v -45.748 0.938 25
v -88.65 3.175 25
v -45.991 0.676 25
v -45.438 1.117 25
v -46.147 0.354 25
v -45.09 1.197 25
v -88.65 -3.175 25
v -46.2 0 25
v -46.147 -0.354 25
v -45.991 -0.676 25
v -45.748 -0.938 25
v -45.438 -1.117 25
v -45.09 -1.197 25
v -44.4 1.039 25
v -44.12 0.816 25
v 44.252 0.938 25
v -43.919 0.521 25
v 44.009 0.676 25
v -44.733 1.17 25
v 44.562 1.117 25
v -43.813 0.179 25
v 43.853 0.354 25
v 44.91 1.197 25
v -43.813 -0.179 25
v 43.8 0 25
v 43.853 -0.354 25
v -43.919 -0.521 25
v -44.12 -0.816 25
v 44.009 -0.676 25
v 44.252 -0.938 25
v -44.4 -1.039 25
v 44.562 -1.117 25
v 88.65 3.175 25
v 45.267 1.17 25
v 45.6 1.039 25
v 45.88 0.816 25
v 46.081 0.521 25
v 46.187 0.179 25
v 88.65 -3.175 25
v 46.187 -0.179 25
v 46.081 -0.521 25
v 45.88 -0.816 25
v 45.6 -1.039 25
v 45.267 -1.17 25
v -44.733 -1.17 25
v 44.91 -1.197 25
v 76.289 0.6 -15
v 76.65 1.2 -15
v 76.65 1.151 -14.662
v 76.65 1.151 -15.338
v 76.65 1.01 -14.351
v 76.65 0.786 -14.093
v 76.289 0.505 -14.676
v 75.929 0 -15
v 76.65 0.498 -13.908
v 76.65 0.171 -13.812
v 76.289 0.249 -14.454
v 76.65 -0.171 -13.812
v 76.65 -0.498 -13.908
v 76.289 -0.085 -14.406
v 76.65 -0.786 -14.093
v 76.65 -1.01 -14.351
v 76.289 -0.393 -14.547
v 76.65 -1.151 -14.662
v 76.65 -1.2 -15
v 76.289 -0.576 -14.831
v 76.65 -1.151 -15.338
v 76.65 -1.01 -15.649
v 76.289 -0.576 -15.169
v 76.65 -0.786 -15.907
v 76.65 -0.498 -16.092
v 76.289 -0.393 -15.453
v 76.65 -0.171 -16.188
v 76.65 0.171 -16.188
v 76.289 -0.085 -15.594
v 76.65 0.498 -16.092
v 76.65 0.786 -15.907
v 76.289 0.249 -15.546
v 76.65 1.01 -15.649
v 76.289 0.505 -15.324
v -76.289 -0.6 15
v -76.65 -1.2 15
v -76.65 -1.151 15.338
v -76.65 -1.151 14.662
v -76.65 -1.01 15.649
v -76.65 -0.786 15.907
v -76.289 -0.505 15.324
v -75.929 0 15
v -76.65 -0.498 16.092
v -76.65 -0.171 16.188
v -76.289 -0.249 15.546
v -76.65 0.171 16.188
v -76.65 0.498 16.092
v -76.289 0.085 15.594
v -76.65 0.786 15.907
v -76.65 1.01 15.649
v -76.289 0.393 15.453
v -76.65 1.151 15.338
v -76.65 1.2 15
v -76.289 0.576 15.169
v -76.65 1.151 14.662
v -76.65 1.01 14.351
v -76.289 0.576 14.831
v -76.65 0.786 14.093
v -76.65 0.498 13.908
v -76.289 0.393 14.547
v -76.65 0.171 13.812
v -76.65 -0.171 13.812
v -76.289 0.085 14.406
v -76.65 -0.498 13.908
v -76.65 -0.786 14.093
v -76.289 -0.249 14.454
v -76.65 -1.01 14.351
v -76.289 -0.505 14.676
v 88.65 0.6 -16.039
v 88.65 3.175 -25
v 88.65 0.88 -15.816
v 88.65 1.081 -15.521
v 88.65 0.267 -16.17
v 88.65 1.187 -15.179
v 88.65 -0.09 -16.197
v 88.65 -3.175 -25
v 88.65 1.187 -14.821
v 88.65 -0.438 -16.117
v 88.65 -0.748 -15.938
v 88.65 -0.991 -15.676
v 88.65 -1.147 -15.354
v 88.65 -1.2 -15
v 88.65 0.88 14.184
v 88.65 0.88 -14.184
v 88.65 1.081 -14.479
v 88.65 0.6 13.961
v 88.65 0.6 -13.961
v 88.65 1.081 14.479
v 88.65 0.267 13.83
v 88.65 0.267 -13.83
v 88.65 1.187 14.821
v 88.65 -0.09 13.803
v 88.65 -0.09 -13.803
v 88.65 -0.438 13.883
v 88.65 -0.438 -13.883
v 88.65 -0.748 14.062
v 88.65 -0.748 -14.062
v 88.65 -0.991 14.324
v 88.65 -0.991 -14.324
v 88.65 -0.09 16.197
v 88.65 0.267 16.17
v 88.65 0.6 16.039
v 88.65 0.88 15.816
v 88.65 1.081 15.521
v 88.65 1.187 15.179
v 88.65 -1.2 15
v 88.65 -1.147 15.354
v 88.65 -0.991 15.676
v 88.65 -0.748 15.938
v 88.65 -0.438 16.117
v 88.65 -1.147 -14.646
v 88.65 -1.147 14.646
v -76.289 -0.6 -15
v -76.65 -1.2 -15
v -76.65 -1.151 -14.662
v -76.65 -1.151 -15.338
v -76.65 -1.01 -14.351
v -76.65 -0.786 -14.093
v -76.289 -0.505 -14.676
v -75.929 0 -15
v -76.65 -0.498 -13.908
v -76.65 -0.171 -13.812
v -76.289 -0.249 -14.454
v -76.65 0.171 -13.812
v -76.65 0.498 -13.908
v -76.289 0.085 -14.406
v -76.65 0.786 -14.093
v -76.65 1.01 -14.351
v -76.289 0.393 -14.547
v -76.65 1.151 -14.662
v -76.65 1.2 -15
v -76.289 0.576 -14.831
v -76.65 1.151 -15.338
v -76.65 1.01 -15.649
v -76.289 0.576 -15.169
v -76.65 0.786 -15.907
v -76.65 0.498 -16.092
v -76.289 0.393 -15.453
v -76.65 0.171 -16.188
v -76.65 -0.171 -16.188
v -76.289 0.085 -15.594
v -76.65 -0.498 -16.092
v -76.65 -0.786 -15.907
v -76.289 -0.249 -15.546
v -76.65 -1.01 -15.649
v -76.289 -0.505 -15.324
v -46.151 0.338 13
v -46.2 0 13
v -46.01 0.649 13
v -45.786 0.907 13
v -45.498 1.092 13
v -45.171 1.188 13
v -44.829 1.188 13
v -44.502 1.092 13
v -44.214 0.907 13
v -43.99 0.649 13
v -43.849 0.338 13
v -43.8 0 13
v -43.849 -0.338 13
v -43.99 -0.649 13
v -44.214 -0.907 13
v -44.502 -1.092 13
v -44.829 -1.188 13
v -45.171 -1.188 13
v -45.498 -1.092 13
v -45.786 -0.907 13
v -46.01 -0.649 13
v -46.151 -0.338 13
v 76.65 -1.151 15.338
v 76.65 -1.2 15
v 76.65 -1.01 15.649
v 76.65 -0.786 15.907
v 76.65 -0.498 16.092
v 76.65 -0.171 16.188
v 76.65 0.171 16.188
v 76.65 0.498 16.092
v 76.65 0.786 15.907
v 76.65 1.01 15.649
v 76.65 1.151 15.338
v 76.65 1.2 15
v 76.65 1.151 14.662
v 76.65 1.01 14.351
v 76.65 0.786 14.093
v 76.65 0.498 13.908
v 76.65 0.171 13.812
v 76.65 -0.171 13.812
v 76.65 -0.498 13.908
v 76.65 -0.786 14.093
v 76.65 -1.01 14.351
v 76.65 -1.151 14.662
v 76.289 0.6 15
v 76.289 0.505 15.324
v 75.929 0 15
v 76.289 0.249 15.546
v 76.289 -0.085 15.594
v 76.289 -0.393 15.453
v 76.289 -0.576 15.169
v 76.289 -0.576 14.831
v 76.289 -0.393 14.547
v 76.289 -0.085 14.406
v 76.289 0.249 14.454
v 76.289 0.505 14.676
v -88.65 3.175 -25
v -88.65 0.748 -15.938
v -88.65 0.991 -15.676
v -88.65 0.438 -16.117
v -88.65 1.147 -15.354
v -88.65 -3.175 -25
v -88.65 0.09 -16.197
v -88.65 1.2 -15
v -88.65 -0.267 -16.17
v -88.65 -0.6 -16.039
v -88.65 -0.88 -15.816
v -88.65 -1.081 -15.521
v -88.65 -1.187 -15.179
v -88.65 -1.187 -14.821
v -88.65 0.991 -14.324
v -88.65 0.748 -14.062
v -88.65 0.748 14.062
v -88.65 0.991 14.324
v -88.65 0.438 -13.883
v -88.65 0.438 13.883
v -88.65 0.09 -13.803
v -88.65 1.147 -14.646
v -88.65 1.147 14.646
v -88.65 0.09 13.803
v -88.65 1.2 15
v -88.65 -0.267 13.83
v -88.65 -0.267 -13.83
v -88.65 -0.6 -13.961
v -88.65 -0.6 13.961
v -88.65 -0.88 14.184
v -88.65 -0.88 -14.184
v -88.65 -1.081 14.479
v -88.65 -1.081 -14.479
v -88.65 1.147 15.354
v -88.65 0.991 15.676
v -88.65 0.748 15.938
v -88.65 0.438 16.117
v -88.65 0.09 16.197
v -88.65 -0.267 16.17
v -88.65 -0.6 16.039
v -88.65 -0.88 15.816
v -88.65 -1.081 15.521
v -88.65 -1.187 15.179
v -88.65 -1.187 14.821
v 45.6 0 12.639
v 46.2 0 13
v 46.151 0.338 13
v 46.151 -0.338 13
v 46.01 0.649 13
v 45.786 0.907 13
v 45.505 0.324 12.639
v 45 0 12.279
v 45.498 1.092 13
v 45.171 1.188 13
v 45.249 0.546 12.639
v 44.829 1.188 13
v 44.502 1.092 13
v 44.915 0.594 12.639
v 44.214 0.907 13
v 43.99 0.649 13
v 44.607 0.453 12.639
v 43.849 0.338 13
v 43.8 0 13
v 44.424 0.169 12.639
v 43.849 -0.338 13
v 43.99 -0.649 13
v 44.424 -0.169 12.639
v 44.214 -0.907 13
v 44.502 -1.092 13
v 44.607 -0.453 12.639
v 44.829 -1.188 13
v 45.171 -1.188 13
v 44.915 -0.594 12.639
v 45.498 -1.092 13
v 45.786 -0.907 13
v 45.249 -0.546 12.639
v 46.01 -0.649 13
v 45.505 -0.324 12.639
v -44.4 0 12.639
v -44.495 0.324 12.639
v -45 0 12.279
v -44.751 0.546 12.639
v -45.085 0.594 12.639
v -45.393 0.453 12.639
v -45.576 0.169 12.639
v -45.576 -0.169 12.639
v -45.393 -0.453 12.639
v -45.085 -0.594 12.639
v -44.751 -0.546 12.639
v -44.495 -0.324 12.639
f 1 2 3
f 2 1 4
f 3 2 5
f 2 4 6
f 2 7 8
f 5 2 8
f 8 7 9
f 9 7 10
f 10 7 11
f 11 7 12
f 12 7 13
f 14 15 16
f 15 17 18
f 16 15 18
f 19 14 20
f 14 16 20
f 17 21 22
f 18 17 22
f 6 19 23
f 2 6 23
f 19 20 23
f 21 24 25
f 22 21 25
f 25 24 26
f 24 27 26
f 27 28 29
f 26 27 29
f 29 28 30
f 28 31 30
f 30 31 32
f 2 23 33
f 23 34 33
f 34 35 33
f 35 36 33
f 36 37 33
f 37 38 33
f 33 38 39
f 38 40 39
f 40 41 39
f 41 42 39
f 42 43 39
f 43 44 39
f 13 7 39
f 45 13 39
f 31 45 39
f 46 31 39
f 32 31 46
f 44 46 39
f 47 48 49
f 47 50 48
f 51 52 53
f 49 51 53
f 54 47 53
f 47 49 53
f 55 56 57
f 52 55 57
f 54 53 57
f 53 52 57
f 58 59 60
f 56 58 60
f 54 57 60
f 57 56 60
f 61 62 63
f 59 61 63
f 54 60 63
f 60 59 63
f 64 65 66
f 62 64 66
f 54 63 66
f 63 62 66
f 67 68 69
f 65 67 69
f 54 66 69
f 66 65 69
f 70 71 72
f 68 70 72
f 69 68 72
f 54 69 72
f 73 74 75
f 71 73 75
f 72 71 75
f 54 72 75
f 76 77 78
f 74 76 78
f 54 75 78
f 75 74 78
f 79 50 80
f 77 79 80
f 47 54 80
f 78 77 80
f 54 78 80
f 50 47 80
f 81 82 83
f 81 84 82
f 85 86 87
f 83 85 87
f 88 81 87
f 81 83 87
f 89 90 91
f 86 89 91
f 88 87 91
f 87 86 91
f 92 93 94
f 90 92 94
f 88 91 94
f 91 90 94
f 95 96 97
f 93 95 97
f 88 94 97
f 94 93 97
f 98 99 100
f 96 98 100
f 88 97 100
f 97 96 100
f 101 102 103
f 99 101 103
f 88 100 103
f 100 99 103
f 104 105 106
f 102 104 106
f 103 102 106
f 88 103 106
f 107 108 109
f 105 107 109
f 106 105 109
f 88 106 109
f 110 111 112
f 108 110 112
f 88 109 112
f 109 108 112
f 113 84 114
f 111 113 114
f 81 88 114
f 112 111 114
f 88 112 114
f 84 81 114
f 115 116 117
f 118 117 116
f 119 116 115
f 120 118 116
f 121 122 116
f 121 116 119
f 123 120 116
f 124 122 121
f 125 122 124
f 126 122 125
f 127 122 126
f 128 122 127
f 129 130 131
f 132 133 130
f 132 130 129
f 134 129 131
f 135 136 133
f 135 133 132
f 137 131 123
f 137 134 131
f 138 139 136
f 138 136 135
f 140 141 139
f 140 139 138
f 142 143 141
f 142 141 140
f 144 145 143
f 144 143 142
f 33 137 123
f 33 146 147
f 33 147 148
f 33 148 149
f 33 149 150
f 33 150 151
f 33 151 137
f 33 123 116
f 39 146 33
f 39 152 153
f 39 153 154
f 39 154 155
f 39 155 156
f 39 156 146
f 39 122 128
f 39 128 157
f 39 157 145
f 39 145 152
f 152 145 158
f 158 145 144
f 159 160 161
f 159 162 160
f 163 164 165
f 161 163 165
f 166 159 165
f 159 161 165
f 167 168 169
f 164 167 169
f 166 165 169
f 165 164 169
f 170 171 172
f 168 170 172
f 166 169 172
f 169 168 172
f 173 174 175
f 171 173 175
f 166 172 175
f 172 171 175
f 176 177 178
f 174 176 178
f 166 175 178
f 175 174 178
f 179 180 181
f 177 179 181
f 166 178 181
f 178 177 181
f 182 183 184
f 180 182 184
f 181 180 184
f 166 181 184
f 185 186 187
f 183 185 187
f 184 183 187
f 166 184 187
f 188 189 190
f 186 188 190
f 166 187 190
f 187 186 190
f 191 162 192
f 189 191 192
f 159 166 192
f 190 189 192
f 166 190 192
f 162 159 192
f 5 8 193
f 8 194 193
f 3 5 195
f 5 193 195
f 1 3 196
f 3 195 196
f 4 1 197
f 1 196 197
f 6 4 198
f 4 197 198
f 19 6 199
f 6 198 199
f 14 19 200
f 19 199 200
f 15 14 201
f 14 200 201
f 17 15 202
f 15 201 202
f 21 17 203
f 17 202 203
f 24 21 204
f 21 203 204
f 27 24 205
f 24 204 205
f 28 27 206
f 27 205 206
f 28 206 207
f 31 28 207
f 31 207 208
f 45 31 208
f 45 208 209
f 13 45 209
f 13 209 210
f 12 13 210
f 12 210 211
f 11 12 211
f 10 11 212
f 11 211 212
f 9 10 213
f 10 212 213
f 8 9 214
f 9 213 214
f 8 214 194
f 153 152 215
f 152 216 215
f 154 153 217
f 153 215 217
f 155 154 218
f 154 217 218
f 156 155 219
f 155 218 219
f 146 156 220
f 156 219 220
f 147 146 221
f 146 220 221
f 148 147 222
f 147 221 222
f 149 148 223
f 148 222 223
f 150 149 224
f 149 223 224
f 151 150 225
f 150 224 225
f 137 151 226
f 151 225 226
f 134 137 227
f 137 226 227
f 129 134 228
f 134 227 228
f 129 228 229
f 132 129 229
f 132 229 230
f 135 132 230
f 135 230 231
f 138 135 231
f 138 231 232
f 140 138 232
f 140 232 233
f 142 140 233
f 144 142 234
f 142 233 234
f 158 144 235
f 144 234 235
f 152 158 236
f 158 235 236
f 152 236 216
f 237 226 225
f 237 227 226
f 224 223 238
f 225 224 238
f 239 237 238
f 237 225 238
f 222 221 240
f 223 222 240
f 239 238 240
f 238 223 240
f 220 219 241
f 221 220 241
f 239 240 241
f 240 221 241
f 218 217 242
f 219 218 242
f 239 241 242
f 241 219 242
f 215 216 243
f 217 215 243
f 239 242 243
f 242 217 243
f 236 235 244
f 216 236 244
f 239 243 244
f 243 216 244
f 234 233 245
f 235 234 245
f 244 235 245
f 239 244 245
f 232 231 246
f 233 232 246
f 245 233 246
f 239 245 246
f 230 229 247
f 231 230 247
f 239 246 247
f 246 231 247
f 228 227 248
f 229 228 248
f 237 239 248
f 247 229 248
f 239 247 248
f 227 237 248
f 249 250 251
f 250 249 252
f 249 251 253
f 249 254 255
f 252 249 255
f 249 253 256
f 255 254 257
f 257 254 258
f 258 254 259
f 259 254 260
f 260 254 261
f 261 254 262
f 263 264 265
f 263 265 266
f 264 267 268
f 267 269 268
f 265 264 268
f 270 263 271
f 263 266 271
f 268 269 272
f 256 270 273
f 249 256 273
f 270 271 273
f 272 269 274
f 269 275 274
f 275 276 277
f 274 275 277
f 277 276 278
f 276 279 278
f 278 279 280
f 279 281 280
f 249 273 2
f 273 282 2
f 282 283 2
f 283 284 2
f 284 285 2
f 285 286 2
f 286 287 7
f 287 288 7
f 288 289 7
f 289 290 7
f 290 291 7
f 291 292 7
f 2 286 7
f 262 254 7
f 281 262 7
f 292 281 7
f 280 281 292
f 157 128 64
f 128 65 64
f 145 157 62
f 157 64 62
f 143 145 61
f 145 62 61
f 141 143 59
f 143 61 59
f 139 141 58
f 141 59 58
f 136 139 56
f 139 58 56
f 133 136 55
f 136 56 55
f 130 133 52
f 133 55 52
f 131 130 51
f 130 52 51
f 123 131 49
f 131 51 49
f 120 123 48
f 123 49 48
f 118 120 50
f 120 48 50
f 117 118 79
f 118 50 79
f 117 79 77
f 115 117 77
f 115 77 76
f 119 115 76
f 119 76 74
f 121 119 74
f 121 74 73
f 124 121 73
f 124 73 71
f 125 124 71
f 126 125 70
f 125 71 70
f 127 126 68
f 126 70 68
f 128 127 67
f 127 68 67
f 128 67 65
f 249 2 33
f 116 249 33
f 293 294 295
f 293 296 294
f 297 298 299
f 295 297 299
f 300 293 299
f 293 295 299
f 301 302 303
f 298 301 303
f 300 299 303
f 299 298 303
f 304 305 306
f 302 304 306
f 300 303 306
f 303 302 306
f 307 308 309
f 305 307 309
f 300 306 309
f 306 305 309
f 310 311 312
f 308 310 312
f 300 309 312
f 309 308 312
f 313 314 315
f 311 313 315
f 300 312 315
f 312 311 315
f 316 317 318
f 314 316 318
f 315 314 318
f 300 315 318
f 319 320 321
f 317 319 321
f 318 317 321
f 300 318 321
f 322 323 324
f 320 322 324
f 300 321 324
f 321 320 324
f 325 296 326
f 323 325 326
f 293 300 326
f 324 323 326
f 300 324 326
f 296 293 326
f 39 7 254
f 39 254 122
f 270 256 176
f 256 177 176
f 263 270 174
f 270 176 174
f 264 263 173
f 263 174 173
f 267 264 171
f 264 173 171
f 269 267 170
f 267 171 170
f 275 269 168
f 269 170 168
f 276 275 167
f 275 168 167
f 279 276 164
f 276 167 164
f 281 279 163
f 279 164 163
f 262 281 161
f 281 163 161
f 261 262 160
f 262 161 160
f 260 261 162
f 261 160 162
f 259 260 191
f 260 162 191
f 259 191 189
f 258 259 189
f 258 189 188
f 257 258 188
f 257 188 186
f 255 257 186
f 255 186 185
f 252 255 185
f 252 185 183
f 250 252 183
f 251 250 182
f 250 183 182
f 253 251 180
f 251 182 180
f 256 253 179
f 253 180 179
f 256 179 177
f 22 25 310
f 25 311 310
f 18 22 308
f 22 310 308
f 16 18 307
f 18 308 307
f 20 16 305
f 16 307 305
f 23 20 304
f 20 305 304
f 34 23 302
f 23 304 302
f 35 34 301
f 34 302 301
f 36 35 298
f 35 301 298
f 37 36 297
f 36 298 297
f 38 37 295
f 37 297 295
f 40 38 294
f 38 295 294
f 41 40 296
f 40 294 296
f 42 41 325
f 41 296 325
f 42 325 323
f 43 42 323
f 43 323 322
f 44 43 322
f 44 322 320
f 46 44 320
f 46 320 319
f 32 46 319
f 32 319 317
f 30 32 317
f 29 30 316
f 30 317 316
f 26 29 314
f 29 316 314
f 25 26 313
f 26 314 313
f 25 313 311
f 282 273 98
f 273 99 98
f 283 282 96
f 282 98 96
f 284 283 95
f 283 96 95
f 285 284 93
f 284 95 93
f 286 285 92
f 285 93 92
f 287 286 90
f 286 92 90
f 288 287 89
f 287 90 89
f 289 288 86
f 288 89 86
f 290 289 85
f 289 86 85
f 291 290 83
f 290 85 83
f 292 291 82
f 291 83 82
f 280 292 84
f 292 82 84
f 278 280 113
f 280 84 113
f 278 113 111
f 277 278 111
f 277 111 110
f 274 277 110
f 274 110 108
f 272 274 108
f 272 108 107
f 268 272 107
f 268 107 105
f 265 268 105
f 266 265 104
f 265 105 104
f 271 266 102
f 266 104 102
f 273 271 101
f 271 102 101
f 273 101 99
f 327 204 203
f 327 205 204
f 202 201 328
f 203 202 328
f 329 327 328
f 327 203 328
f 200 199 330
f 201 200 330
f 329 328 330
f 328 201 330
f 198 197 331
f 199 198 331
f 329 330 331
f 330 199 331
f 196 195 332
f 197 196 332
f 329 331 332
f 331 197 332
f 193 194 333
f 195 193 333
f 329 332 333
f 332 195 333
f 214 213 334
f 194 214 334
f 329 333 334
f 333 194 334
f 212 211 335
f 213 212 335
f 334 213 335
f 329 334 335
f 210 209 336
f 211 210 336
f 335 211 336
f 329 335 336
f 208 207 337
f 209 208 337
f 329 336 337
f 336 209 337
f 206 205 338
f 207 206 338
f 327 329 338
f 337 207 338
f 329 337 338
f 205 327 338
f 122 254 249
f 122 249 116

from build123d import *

# Parameters (mm, degrees)
F0_W           = 177.3
F0_H           = 50
F1_DEPTH       = 3.175
F3_D           = 2.4
F3_DEPTH       = 12
F3_TIP         = 0.7210327428
F6_D           = 2.4
F6_DEPTH       = 12
F6_TIP         = 0.7210327428
F6_ON_F4_D     = 2.4
F6_ON_F4_DEPTH = 12
F6_ON_F4_TIP   = 0.7210327428


with BuildPart() as f1:
    # F0 (on Front) → F1 (new body, symmetric)
    with BuildSketch(Plane.XZ):
        Rectangle(F0_W, F0_H)
    extrude(amount=F1_DEPTH, both=True)

    # F3
    with Locations(Plane.XY.offset(25)):
        with Locations((-45, 0), (45, 0)):
            Hole(F3_D / 2, depth=F3_DEPTH)
            with Locations((0, 0, -(F3_DEPTH + F3_TIP / 2))):  # 118° drill point
                Cone(0, F3_D / 2, F3_TIP, mode=Mode.SUBTRACT)

    # F6
    with Locations(Plane(origin=(-88.65, 0, 0), x_dir=(0, -1, 0), z_dir=(-1, 0, 0))):
        with Locations((0, 15), (0, -15)):
            Hole(F6_D / 2, depth=F6_DEPTH)
            with Locations((0, 0, -(F6_DEPTH + F6_TIP / 2))):  # 118° drill point
                Cone(0, F6_D / 2, F6_TIP, mode=Mode.SUBTRACT)

    # F6 on F4
    with Locations(Plane.YZ.offset(88.65)):
        with Locations((0, 15), (0, -15)):
            Hole(F6_ON_F4_D / 2, depth=F6_ON_F4_DEPTH)
            with Locations((0, 0, -(F6_ON_F4_DEPTH + F6_ON_F4_TIP / 2))):  # 118° drill point
                Cone(0, F6_ON_F4_D / 2, F6_ON_F4_TIP, mode=Mode.SUBTRACT)


solid = f1.part
